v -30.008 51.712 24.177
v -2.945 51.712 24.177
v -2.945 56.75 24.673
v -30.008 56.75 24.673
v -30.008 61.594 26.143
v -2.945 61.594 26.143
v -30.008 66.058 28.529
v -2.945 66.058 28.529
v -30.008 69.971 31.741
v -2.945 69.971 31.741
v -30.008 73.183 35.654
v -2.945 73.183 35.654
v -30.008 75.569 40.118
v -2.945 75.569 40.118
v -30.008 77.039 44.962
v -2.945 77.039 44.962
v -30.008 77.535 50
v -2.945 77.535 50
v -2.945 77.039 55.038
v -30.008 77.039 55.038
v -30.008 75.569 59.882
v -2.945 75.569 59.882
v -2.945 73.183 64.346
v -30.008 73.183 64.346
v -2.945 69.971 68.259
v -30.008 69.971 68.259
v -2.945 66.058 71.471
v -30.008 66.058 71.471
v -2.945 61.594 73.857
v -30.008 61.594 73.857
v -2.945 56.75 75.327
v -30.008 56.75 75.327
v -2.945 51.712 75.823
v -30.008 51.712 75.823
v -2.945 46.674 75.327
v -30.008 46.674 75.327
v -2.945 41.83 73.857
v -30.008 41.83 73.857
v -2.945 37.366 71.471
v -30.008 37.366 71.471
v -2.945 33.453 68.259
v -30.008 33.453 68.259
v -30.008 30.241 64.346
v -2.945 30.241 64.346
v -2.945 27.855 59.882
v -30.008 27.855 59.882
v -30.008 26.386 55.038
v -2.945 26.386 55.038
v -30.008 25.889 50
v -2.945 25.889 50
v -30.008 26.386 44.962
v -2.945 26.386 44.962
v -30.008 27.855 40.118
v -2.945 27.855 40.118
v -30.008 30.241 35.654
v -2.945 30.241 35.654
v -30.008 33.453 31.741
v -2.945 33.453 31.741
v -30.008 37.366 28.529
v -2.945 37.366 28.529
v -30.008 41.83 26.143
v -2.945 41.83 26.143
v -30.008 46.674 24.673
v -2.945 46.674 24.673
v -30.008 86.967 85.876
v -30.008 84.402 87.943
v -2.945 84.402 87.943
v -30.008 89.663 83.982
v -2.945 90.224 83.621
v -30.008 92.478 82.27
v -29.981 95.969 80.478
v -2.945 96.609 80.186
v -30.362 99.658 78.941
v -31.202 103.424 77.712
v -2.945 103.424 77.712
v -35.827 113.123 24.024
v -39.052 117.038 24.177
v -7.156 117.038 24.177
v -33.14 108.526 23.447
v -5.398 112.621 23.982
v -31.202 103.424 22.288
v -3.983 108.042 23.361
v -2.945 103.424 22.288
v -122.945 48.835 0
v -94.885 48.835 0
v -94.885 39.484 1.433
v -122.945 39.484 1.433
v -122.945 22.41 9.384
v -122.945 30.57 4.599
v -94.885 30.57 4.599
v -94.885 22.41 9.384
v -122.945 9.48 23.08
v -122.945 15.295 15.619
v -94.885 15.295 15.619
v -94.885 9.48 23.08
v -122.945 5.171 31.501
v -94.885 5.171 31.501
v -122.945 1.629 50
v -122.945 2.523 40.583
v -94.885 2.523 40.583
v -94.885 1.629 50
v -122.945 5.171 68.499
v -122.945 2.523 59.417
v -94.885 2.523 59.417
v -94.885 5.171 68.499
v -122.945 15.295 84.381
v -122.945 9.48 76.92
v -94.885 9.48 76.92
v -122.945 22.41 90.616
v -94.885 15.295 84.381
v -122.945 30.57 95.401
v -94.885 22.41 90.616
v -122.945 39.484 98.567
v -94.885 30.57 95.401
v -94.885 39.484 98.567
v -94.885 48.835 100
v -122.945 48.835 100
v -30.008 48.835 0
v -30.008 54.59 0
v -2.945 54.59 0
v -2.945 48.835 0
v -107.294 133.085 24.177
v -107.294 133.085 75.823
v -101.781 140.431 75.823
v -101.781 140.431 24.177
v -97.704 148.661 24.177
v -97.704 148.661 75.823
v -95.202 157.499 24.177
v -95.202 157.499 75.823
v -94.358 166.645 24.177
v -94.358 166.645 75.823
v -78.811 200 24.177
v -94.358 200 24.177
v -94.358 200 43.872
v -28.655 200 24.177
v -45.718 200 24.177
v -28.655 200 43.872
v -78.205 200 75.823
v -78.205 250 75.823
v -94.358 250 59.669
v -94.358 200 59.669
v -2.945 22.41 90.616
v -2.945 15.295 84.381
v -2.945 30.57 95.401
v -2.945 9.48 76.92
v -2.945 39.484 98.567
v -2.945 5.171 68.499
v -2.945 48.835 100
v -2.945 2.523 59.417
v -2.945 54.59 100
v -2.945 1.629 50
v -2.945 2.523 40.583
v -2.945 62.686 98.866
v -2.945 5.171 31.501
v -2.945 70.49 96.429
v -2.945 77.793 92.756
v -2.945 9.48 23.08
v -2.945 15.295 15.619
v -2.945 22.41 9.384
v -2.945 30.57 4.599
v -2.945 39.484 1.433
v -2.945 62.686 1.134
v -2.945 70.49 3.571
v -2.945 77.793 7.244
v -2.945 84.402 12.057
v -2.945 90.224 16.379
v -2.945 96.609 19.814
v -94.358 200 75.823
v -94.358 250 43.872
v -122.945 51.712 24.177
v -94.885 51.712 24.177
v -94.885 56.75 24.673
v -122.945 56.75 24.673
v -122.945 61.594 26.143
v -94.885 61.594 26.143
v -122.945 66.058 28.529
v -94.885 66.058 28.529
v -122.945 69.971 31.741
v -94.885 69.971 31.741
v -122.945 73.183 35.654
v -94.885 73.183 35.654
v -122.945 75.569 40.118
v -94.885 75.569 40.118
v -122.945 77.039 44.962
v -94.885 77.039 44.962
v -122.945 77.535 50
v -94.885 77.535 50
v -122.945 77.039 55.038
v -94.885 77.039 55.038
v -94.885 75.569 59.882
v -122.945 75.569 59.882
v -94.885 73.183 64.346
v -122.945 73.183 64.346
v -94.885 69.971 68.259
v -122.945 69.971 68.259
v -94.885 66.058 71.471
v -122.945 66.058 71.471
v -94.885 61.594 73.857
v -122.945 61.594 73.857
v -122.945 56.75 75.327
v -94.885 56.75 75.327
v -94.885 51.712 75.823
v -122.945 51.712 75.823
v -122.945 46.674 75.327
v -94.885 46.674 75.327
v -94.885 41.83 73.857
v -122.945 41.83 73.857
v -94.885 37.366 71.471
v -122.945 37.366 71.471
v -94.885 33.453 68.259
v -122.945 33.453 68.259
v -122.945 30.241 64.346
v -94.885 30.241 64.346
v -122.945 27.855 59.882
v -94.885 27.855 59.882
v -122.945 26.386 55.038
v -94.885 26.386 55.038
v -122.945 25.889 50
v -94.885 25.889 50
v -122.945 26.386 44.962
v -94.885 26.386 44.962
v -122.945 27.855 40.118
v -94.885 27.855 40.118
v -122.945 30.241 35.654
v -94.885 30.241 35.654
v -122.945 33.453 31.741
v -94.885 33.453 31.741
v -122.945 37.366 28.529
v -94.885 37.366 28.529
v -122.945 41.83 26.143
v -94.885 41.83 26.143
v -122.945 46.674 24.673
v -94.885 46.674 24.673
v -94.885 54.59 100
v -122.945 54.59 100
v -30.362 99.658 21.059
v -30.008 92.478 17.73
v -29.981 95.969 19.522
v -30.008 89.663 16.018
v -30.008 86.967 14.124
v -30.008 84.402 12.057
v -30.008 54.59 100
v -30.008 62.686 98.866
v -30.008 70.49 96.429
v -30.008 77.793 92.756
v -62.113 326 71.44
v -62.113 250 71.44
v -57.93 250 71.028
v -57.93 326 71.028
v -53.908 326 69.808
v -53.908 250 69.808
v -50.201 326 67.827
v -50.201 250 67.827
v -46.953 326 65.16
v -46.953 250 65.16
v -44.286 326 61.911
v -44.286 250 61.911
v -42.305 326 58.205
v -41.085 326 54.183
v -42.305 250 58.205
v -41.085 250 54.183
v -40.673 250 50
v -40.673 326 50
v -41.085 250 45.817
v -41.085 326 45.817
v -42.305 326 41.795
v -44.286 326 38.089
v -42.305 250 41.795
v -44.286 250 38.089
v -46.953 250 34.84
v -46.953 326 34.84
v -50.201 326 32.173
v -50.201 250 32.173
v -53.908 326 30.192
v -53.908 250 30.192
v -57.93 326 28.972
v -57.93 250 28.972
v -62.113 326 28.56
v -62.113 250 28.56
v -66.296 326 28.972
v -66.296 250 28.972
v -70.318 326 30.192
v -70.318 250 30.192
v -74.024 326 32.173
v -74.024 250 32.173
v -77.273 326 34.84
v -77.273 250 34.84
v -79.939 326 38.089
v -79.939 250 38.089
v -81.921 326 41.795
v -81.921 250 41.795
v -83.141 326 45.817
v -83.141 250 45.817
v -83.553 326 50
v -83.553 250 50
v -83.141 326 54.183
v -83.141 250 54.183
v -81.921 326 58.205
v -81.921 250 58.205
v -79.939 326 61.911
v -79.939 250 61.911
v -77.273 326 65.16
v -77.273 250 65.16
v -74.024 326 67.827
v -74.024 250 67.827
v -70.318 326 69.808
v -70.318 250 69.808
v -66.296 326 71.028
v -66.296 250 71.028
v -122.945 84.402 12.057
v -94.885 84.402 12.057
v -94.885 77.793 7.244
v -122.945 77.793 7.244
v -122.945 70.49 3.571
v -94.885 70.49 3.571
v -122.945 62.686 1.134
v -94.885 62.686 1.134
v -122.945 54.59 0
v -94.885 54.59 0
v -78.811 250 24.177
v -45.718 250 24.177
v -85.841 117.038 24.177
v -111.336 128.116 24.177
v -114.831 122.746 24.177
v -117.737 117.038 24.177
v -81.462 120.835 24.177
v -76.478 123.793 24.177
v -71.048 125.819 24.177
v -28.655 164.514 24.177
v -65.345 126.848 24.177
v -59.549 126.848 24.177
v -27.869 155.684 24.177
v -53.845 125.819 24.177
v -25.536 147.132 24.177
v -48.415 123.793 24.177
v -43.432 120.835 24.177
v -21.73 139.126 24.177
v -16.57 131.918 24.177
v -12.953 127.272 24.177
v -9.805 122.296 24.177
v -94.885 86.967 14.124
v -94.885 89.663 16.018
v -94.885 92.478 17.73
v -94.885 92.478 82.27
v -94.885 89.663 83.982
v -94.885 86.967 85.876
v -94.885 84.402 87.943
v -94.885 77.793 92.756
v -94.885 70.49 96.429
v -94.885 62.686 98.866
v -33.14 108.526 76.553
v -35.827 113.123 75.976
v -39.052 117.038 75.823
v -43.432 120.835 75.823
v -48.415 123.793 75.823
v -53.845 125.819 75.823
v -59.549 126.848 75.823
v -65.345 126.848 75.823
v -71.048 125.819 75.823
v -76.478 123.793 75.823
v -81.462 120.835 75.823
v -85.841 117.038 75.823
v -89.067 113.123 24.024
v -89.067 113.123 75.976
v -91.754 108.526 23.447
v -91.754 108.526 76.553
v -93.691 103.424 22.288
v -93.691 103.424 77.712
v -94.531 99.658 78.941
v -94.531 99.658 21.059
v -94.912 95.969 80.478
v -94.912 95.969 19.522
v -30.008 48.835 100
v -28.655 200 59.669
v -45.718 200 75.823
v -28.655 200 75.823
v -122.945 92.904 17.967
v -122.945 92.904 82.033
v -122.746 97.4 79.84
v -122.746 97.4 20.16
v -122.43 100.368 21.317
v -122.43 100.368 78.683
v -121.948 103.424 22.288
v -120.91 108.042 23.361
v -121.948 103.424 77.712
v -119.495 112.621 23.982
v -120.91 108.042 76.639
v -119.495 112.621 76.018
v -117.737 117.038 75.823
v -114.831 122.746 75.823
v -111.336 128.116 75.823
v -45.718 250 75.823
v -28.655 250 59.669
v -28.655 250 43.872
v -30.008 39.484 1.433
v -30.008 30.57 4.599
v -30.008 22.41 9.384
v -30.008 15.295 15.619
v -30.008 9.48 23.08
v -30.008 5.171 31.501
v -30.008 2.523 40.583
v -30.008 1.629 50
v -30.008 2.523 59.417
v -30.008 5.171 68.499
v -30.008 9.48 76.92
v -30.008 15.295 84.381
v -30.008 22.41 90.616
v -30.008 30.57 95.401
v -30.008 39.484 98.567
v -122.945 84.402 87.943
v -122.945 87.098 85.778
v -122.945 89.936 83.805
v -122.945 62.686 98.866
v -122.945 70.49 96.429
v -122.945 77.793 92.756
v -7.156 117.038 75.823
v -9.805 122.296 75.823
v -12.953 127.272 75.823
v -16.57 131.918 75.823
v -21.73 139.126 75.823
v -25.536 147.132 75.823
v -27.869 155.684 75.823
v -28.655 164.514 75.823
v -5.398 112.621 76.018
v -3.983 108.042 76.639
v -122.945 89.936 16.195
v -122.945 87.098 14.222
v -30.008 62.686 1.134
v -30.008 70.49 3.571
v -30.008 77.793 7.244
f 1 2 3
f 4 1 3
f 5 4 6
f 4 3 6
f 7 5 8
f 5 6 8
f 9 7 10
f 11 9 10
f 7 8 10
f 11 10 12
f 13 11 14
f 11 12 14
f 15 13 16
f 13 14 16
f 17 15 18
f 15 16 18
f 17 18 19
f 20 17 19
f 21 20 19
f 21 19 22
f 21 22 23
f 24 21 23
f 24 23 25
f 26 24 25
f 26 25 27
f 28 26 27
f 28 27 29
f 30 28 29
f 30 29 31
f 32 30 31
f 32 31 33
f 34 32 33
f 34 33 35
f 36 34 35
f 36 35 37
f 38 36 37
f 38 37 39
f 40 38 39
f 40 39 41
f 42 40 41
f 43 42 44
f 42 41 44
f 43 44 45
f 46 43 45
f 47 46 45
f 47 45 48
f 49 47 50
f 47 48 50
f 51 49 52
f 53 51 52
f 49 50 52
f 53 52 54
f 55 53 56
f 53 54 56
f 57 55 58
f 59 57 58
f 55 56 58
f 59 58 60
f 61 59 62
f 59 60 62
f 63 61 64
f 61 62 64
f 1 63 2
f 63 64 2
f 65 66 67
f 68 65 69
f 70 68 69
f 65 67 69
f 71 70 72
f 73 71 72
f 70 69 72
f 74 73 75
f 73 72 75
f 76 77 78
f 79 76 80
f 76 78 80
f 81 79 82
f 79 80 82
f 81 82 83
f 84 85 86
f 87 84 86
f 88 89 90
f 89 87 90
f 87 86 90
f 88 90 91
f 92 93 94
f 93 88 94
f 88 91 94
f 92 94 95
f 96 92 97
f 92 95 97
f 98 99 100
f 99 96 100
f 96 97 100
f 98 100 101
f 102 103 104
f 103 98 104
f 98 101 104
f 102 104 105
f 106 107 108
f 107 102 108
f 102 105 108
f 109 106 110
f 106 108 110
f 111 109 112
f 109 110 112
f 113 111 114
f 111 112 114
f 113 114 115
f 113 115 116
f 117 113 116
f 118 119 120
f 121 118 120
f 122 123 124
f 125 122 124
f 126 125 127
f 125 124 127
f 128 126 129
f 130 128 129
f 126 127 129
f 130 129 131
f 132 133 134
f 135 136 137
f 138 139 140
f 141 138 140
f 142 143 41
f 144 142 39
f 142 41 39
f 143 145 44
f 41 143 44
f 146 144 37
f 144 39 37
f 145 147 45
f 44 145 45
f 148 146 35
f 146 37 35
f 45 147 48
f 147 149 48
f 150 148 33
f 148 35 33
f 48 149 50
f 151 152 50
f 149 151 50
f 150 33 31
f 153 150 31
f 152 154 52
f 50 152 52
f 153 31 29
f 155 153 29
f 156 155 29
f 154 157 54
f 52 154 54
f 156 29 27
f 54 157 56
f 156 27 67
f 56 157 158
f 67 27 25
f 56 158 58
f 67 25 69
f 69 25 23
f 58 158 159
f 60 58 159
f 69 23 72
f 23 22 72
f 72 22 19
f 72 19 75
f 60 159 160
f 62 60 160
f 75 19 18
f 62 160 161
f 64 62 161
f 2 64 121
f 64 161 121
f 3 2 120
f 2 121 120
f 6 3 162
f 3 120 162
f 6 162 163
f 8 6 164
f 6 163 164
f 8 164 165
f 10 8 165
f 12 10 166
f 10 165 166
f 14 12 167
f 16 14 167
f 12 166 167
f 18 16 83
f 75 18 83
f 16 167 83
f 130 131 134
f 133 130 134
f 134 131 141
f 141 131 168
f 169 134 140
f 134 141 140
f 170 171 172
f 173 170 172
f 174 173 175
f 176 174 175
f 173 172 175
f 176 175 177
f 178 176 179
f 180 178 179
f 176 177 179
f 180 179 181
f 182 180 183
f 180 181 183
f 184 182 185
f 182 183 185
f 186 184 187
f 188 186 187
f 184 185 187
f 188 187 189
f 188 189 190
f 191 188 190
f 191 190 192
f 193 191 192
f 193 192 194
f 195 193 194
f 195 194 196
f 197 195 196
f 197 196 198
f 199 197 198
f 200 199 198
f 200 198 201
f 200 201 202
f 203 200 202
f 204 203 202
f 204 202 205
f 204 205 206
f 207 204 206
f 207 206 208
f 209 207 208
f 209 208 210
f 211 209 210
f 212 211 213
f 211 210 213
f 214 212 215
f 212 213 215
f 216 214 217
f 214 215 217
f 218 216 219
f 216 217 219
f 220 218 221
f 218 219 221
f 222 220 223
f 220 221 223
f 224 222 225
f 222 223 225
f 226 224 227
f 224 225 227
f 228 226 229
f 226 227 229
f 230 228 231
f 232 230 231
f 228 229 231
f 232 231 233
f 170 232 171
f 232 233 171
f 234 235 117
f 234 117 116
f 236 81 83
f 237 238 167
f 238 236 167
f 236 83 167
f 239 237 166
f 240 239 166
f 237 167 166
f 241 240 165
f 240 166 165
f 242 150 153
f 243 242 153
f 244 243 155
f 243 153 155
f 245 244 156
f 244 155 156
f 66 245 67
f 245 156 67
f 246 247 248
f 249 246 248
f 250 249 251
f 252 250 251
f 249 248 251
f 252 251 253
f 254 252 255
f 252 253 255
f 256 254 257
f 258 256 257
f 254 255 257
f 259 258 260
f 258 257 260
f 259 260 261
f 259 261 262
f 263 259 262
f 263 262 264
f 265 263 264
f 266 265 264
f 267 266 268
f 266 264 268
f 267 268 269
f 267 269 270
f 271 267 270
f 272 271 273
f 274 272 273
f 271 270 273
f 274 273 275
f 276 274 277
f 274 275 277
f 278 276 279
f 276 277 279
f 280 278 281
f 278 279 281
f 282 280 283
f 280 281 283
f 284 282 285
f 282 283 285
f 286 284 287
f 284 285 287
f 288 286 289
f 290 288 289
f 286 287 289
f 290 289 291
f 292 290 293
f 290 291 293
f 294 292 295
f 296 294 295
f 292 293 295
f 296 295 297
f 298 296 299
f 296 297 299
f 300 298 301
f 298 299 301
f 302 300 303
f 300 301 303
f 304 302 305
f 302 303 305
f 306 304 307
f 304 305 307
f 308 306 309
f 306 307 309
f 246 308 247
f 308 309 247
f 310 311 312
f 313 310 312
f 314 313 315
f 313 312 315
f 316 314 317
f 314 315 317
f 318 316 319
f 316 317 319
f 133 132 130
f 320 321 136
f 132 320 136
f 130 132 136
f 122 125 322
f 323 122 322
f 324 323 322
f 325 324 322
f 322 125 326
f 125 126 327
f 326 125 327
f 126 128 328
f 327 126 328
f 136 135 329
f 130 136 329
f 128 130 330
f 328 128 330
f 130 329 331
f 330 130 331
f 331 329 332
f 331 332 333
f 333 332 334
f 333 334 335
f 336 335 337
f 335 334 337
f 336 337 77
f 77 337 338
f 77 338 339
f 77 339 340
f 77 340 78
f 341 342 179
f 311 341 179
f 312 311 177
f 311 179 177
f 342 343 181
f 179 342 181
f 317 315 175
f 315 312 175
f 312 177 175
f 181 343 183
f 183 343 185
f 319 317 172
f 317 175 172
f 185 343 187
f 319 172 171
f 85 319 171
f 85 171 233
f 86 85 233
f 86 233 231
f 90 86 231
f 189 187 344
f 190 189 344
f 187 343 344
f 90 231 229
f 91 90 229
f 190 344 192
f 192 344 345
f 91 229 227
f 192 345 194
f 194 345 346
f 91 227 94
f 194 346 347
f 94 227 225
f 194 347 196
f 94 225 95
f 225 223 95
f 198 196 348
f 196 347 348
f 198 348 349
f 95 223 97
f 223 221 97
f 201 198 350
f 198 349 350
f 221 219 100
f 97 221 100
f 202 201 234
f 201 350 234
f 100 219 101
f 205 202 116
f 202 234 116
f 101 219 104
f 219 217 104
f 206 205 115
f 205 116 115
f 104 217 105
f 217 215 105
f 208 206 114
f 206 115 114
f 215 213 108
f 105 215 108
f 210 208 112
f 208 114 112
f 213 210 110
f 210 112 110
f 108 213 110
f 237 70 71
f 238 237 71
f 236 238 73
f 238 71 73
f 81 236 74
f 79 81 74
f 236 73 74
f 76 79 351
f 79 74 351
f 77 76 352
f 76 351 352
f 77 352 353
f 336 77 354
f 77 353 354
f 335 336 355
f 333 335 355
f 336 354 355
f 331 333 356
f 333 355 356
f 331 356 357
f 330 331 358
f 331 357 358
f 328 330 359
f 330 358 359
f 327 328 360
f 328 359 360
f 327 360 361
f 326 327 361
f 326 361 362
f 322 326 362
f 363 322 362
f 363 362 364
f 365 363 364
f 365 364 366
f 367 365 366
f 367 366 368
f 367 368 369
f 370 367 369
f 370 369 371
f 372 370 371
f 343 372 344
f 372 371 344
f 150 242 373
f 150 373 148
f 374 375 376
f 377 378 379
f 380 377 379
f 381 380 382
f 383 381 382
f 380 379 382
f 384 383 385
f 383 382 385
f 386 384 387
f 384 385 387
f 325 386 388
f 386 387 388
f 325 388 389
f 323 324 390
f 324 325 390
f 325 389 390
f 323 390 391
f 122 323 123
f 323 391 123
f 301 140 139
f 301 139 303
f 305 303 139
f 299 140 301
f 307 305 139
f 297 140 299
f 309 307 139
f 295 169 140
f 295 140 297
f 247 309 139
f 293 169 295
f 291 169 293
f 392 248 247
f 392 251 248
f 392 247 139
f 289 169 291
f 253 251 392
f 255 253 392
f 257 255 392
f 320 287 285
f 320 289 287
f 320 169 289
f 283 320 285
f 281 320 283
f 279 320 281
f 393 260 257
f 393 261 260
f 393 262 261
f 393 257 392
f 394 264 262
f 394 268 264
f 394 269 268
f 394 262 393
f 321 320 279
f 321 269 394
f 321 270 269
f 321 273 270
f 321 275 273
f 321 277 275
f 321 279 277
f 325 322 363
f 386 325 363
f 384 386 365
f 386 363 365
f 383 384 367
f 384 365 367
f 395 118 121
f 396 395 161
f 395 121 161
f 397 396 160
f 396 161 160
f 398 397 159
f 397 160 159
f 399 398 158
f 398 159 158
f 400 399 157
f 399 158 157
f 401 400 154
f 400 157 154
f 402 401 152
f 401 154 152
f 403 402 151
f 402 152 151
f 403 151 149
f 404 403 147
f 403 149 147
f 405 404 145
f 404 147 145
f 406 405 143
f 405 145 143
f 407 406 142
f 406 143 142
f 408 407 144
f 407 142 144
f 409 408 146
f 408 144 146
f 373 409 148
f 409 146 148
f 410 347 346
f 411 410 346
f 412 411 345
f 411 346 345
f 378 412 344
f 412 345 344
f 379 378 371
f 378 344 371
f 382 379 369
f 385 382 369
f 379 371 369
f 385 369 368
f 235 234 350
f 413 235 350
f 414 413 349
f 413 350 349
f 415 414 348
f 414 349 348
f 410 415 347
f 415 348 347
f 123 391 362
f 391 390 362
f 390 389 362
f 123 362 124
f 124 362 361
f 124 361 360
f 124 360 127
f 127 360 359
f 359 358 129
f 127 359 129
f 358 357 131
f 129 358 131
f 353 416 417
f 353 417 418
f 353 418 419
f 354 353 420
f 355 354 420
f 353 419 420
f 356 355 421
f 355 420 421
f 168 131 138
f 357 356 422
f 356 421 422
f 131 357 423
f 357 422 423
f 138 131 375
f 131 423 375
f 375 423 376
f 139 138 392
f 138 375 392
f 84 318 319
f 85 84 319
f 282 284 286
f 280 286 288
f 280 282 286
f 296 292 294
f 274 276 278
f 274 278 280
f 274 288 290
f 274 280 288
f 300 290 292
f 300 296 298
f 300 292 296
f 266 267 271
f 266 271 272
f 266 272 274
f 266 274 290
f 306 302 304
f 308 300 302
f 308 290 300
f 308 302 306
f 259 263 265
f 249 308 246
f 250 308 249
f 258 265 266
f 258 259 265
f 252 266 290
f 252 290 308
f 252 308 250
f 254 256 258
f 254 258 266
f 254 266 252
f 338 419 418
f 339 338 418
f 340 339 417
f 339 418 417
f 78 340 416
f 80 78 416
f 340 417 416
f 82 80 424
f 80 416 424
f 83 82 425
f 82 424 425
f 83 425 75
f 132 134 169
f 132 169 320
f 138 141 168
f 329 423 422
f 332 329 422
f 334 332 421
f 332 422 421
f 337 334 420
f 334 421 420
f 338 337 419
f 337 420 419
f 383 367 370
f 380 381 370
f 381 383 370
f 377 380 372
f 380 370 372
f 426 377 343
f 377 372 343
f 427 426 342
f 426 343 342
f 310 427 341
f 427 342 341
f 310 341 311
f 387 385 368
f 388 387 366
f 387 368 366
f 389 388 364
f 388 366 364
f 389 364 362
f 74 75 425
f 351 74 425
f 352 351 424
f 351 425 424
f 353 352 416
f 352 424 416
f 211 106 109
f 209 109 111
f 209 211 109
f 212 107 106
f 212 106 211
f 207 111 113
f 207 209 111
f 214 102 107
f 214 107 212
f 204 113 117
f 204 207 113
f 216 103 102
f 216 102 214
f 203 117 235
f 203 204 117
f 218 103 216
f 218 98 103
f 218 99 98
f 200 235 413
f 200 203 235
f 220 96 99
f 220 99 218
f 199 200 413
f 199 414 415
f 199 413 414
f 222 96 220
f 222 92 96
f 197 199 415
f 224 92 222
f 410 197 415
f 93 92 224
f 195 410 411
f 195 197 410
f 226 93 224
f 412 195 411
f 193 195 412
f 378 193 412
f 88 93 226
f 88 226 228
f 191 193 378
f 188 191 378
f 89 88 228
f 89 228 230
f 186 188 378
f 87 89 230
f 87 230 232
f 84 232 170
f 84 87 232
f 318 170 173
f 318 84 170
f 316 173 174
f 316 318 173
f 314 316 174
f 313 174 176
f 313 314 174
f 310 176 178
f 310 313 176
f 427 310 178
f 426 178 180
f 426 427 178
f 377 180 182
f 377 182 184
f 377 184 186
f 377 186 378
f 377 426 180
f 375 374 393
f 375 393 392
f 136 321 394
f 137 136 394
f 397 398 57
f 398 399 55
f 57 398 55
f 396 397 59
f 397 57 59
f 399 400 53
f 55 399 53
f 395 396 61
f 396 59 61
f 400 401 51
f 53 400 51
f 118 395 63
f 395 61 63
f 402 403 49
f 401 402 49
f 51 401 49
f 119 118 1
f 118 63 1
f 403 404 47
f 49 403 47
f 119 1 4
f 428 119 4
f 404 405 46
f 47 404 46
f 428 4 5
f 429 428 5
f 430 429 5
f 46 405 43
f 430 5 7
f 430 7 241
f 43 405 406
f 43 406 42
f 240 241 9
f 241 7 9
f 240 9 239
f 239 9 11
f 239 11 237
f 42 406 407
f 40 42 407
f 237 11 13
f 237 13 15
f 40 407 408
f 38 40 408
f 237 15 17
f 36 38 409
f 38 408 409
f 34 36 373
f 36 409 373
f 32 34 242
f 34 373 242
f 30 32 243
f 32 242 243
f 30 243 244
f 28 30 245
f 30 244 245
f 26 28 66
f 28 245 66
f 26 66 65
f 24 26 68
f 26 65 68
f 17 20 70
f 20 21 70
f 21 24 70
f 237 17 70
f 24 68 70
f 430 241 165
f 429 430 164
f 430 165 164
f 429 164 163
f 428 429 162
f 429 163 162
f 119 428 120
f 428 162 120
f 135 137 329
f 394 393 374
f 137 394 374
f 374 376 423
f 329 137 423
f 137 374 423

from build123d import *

# Parameters (mm, degrees)
SKETCH1_W           = 120
SKETCH1_H           = 250
BOSS_EXTRUDE1_DEPTH = 100
CUT_EXTRUDE4_DEPTH  = 296.999195185
SKETCH3_R           = 25.822682523
CUT_EXTRUDE5_DEPTH  = 295.78805946
CUT_EXTRUDE6_DEPTH  = 50
SKETCH5_R           = 21.439897113
BOSS_EXTRUDE2_DEPTH = 76


with BuildPart() as part:
    # Sketch1 → Boss-Extrude1 (new body)
    with BuildSketch(Plane.XY):
        with Locations((-62.945205479, 125)):
            Rectangle(SKETCH1_W, SKETCH1_H)
    extrude(amount=BOSS_EXTRUDE1_DEPTH)

    # Sketch2 → Cut-Extrude4 (cut, through all)
    with BuildSketch(Plane.XY.offset(100)):
        with BuildLine():
            ThreePointArc((-30.008304656, 92.477893201), (-62.446707823, 126.977893201), (-94.885110989, 92.477893201))
            Line((-94.885110989, 92.477893201), (-94.885110989, 0))
            Line((-94.885110989, 0), (-30.008304656, 0))
            Line((-30.008304656, 0), (-30.008304656, 92.477893201))
        make_face()
        with BuildLine():
            Line((-122.945205479, 250), (-122.945205479, 92.904251347))
            ThreePointArc((-122.945205479, 92.904251347), (-118.821122518, 114.436385128), (-107.294308503, 133.085068837))
            ThreePointArc((-107.294308503, 133.085068837), (-97.704359806, 148.661484818), (-94.358441298, 166.644718124))
            Line((-94.358441298, 166.644718124), (-94.358441298, 250))
            Line((-94.358441298, 250), (-122.945205479, 250))
        make_face()
        with BuildLine():
            ThreePointArc((-16.569647846, 131.918295936), (-7.86521834, 118.575996693), (-2.945205479, 103.424181106))
            Line((-2.945205479, 103.424181106), (-2.945205479, 250))
            Line((-2.945205479, 250), (-28.654722245, 250))
            Line((-28.654722245, 250), (-28.654722245, 164.513670097))
            ThreePointArc((-28.654722245, 164.513670097), (-25.536201958, 147.131873297), (-16.569647846, 131.918295936))
        make_face()
    extrude(amount=-CUT_EXTRUDE4_DEPTH, mode=Mode.SUBTRACT)

    # Sketch3 → Cut-Extrude5 (cut, through all)
    with BuildSketch(Plane(origin=(-2.945205479, 0, 0), x_dir=(0, 0, -1), z_dir=(1, 0, 0))):
        with BuildLine():
            Line((-75.822682523, 117.037988815), (-75.822682523, 250))
            Line((-75.822682523, 250), (-100, 250))
            Line((-100, 250), (-100, 164.513670097))
            Line((-100, 164.513670097), (-100, 131.918295936))
            Line((-100, 131.918295936), (-100, 103.424181106))
            Line((-100, 103.424181106), (-77.711724939, 103.424181106))
            ThreePointArc((-77.711724939, 103.424181106), (-76.297194746, 110.165866843), (-75.822682523, 117.037988815))
        make_face()
        with BuildLine():
            ThreePointArc((-87.942678111, 84.402038305), (-81.787788797, 93.35406738), (-77.711724939, 103.424181106))
            Line((-77.711724939, 103.424181106), (-100, 103.424181106))
            Line((-100, 103.424181106), (-100, 54.589503668))
            ThreePointArc((-100, 54.589503668), (-96.429252241, 70.48984448), (-87.942678111, 84.402038305))
        make_face()
        with BuildLine():
            ThreePointArc((0, 48.834677438), (-50, 1.629363928), (-100, 48.834677438))
            Line((-100, 48.834677438), (-100, 0))
            Line((-100, 0), (0, 0))
            Line((0, 0), (0, 48.834677438))
        make_face()
        with BuildLine():
            Line((0, 103.424181106), (-22.288275061, 103.424181106))
            ThreePointArc((-22.288275061, 103.424181106), (-18.212211203, 93.35406738), (-12.057321889, 84.402038305))
            ThreePointArc((-12.057321889, 84.402038305), (-3.570747759, 70.48984448), (0, 54.589503668))
            Line((0, 54.589503668), (0, 103.424181106))
        make_face()
        with BuildLine():
            Line((0, 250), (-24.177317477, 250))
            Line((-24.177317477, 250), (-24.177317477, 117.037988815))
            ThreePointArc((-24.177317477, 117.037988815), (-23.702805254, 110.165866843), (-22.288275061, 103.424181106))
            Line((-22.288275061, 103.424181106), (0, 103.424181106))
            Line((0, 103.424181106), (0, 131.918295936))
            Line((0, 131.918295936), (0, 164.513670097))
            Line((0, 164.513670097), (0, 250))
        make_face()
        with Locations((-50, 51.712090553)):
            Circle(SKETCH3_R)
    extrude(amount=-CUT_EXTRUDE5_DEPTH, mode=Mode.SUBTRACT)

    # Sketch4 → Cut-Extrude6 (cut)
    with BuildSketch(Plane(origin=(0, 250, 0), x_dir=(1, 0, 0), z_dir=(0, 1, 0))):
        Polygon((-94.358441298, -43.871698339), (-78.810697557, -24.177317477), (-94.358441298, -24.177317477), align=None)
        Polygon((-78.20485695, -75.822682523), (-94.358441298, -59.669098176), (-94.358441298, -75.822682523), align=None)
        Polygon((-28.654722245, -24.177317477), (-45.717868589, -24.177317477), (-28.654722245, -43.871698339), align=None)
        Polygon((-28.654722245, -75.822682523), (-28.654722245, -59.669098176), (-45.717868589, -75.822682523), align=None)
    extrude(amount=-CUT_EXTRUDE6_DEPTH, mode=Mode.SUBTRACT)

    # Sketch5 → Boss-Extrude2 (add)
    with BuildSketch(Plane(origin=(0, 250, 0), x_dir=(1, 0, 0), z_dir=(0, 1, 0))):
        with Locations(Location((-62.112822921, -50, 0), (0, 0, 270))):
            Circle(SKETCH5_R)
    extrude(amount=BOSS_EXTRUDE2_DEPTH)


solid = part.part
